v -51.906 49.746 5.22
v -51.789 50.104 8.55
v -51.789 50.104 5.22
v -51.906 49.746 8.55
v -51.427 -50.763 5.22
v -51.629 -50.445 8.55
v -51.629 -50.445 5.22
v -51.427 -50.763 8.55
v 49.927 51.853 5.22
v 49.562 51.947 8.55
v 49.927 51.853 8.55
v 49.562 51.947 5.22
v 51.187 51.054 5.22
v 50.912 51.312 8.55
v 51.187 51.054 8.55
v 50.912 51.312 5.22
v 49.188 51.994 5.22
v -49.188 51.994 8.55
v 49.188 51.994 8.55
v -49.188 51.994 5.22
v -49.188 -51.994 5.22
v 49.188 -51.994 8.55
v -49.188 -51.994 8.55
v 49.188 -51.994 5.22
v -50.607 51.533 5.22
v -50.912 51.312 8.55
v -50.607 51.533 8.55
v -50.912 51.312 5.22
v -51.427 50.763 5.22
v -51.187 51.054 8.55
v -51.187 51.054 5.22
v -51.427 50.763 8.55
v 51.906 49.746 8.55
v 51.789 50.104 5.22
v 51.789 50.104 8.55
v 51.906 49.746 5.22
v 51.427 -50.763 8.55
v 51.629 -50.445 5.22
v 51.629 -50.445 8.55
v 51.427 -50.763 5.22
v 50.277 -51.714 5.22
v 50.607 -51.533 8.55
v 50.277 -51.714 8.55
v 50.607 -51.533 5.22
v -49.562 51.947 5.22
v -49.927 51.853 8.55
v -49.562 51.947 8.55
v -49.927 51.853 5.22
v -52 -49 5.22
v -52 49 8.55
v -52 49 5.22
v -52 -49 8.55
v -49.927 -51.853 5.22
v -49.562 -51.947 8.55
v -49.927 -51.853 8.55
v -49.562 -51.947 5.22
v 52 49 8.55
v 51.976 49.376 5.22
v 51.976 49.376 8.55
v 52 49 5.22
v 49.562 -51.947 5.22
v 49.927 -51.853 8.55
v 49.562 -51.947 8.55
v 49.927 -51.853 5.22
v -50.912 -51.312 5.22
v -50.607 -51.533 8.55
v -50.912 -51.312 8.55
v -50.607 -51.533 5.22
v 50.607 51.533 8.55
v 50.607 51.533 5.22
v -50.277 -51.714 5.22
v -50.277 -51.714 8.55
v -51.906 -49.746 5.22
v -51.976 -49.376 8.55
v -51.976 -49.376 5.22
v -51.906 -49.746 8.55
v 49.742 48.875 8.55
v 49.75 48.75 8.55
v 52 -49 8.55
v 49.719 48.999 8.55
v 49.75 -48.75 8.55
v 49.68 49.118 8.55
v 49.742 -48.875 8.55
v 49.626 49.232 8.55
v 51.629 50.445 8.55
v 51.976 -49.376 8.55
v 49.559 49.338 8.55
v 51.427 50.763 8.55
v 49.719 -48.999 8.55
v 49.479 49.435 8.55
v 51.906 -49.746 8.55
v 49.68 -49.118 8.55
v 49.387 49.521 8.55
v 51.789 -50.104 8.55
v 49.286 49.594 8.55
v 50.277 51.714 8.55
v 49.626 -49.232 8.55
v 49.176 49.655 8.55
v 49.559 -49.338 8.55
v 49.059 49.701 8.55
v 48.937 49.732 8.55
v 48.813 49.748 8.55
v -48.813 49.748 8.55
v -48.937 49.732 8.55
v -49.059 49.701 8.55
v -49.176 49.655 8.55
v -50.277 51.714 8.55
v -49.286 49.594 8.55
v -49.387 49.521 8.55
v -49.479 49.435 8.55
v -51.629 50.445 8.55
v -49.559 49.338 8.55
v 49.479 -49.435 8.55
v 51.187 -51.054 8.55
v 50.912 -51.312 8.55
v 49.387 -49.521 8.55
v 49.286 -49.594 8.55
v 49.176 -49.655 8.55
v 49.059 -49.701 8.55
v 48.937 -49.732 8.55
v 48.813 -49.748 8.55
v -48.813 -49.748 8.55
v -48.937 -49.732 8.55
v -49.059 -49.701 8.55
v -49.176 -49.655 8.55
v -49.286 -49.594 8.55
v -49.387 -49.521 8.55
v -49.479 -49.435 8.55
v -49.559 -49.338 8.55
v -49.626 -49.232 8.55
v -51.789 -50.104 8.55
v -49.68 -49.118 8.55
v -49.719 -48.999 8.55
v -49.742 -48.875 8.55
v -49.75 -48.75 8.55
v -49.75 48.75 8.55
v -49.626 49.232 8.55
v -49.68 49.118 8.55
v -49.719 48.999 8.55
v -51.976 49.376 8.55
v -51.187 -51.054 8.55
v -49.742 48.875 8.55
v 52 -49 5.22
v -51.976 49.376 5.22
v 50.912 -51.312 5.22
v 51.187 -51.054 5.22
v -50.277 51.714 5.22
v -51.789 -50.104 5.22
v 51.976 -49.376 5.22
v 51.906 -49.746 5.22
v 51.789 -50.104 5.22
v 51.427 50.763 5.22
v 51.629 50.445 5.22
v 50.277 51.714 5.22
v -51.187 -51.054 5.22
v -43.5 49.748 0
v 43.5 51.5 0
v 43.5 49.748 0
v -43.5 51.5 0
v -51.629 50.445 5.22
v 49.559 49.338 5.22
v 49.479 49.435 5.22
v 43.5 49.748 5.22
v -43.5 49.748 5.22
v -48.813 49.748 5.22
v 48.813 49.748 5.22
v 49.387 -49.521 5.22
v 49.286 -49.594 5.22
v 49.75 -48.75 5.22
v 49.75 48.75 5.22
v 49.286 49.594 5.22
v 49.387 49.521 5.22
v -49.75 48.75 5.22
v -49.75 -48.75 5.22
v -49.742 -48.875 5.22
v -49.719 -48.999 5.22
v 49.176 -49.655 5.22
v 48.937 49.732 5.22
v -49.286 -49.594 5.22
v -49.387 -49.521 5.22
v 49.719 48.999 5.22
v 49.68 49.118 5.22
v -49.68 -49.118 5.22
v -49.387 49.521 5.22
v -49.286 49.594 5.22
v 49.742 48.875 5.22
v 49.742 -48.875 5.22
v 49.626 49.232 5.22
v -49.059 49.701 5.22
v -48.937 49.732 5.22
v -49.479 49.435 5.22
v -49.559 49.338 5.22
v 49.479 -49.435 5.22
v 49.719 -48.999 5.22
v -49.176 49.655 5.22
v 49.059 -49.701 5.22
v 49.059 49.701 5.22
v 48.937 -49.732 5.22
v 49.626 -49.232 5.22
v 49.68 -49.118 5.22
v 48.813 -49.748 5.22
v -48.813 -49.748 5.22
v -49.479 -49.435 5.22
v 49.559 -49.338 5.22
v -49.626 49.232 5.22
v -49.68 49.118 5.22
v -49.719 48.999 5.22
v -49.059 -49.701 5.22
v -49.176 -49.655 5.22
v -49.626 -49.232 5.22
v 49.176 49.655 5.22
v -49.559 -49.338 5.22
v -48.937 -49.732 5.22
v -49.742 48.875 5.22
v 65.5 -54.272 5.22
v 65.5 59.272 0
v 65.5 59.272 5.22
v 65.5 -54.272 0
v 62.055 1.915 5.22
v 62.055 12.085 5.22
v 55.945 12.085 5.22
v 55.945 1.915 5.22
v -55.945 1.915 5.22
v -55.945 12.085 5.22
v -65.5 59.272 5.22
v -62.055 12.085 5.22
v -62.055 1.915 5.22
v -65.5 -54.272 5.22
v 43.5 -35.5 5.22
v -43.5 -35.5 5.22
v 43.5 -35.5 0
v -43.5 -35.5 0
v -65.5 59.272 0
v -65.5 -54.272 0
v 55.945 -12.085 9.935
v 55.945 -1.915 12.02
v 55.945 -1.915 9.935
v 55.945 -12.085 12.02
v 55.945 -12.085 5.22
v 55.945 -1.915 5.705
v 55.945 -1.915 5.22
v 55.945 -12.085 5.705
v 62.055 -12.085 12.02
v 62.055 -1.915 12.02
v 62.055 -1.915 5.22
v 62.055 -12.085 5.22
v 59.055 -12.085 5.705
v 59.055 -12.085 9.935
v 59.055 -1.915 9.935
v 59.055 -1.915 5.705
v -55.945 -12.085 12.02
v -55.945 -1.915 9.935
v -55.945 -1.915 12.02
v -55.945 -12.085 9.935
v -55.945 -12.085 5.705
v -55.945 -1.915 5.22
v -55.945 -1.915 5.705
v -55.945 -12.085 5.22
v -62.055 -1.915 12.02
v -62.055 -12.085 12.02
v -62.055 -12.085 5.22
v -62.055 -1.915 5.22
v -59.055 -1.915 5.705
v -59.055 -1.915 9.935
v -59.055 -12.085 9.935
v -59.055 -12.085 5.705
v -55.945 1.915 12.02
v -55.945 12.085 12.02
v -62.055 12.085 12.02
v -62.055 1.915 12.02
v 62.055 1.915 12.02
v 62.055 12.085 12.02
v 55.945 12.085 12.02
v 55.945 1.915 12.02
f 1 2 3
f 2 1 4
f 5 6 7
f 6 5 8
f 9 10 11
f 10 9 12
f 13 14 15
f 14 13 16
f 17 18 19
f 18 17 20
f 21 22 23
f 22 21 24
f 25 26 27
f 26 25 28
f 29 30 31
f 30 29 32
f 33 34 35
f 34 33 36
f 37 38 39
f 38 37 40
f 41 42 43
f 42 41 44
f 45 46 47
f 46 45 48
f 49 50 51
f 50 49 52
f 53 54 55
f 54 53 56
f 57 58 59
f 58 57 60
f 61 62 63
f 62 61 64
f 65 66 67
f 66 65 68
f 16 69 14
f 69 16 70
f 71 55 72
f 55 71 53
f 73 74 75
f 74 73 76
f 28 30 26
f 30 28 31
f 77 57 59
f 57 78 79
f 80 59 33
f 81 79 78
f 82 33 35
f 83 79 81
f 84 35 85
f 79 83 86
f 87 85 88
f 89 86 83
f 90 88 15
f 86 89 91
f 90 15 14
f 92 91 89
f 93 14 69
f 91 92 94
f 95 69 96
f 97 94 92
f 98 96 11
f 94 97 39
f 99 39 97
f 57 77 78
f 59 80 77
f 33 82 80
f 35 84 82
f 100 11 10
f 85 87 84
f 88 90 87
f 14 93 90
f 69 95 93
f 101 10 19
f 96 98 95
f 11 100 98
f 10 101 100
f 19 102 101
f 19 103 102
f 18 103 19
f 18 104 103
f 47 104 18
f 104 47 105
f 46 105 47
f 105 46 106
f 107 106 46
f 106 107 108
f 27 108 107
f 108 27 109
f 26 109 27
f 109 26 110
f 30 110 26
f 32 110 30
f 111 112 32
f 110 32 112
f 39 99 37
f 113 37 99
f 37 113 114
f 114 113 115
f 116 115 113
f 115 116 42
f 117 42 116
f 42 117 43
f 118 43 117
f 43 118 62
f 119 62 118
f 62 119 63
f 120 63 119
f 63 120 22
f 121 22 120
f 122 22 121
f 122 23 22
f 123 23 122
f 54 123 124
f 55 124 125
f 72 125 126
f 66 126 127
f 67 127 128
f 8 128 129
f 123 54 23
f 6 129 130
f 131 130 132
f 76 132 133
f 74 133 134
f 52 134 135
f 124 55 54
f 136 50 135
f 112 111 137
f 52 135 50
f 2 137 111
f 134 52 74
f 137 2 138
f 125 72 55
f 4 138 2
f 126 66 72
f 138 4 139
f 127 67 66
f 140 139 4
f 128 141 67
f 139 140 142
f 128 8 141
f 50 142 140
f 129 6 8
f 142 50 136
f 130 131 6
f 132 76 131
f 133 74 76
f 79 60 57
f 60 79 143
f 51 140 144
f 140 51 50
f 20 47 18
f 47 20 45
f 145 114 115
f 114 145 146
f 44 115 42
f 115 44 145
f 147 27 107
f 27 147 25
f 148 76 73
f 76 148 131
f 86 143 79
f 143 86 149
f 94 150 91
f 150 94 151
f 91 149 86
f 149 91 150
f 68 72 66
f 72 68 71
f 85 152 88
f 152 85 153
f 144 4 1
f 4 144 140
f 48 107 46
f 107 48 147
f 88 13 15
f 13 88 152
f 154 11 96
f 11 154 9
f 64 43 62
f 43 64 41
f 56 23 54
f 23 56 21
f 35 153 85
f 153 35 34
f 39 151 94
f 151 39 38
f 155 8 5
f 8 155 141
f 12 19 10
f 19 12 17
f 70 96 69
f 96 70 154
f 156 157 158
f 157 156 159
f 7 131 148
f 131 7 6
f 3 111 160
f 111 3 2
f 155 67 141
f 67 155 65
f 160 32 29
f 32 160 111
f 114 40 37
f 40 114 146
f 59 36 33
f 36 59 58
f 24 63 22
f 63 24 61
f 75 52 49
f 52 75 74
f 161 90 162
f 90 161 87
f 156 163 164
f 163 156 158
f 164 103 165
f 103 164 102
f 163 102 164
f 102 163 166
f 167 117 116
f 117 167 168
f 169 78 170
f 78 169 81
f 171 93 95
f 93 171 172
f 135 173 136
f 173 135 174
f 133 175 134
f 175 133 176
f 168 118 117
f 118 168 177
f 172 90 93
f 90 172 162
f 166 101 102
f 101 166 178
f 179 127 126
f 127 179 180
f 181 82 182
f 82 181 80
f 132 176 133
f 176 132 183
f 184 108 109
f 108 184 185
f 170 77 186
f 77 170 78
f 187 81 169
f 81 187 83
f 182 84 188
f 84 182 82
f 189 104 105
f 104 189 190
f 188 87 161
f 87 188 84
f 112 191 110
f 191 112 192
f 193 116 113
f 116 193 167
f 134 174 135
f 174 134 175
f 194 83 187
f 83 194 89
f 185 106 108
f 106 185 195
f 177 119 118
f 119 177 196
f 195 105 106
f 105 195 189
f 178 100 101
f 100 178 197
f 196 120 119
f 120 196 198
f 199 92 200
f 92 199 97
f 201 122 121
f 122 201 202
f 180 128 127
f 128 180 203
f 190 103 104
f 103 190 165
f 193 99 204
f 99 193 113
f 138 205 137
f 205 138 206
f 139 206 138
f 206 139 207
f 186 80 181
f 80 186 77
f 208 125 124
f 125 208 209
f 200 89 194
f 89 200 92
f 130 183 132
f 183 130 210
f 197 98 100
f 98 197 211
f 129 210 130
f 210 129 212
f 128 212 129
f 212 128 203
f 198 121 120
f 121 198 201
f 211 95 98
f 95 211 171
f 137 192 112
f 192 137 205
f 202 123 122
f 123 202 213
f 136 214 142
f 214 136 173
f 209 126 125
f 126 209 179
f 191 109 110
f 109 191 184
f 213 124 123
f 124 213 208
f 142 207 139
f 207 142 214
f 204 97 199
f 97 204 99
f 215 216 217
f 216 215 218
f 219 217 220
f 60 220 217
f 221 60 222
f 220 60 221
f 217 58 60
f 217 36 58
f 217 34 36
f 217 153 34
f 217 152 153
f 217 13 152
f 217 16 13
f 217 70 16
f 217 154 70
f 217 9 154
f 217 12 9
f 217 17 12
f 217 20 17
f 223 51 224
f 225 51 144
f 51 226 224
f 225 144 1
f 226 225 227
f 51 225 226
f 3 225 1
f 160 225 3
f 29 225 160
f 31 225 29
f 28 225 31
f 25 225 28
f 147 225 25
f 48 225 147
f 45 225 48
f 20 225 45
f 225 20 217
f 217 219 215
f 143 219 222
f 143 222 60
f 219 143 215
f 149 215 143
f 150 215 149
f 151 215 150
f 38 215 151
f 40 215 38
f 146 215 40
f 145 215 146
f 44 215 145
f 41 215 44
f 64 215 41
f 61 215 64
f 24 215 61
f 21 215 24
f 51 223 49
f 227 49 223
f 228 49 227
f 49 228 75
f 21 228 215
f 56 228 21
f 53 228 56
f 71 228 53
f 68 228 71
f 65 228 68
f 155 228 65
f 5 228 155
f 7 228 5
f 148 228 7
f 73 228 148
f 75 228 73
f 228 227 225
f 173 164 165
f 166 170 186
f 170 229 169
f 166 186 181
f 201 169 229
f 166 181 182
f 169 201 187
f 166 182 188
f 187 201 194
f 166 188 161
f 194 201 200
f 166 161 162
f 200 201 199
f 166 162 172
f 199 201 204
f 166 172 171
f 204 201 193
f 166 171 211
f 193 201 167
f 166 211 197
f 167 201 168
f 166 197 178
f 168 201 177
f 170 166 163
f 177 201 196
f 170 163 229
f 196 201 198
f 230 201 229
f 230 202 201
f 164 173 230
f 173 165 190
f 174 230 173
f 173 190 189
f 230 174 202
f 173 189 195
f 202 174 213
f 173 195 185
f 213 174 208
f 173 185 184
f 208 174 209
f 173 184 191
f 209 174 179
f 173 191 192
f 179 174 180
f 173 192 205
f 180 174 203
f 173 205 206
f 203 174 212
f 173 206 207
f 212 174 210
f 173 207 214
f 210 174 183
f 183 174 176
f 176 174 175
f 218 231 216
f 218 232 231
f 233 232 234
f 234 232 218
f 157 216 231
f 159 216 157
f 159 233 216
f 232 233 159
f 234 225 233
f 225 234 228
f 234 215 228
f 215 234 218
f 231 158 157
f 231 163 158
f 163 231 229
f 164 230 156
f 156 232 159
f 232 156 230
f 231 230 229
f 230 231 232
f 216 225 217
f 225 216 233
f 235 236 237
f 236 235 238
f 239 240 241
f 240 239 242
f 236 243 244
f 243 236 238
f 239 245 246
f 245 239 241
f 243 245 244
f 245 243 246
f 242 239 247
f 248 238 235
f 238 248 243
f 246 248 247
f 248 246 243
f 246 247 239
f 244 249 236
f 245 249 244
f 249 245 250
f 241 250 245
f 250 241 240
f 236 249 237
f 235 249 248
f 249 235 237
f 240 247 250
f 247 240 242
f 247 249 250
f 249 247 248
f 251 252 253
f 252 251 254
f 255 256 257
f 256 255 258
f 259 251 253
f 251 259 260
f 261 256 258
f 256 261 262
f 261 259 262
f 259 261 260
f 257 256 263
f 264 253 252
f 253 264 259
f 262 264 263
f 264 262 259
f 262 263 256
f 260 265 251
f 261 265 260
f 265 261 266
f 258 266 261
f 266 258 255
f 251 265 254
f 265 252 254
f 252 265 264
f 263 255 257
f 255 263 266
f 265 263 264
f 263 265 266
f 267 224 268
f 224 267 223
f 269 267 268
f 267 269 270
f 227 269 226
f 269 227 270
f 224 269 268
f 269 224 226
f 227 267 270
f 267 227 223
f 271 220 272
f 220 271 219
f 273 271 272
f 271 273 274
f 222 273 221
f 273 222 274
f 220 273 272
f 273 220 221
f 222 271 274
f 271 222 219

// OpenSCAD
// file: lib/misc.scad
/*

Polaroid 600 / Polaroid 600se Adapter

This work is licensed under a Creative Commons Attribution-NonCommercial-ShareAlike 3.0 Unported License.

https://creativecommons.org/licenses/by-nc-sa/3.0/

-----------------------

Various parts


The nubs are stupid


*/

/* Nub dimensions [-------------------------------------------------------------- */

nub_depth = 34.19;
nub_width = 5.76;
nub_distance_from_seal = 2;
nub_distance_from_edge = 13.95;
nub_height_from_zero = 5.52;
nub_height = nub_height_from_zero - box_height;

/* Nub modules [-------------------------------------------------------------- */

module nub(nub_x, nub_y, nub_z) {
    
    translate([nub_x,nub_y,nub_z]){
        nub = [nub_width,nub_depth,nub_height];
                
        cube(nub,  center=true);
                
    }
}


module nubs() {
    nub_position1 = (outer_box_width/2-nub_width/2 - nub_distance_from_edge);
    nub_position2 = outer_box_depth/2-nub_depth/2;
    
    nub(nub_position1, nub_position2*-1, box_height);
    nub(nub_position1*-1, nub_position2, box_height);
    nub(nub_position1*-1, nub_position2*-1, box_height);
    nub(nub_position1, nub_position2, box_height);
    
}
// file: lib/claws.scad
/*

Polaroid 600 / Polaroid 600se Adapter

This work is licensed under a Creative Commons Attribution-NonCommercial-ShareAlike 3.0 Unported License.

https://creativecommons.org/licenses/by-nc-sa/3.0/

-----------------------

Claws to hook into the camera body. 

There are two claws and two dummy claws that don't hook. 

The claws hook into the body via the locking / unlocking mechanism on the 600se. 





*/


/* Claw dimensions [-------------------------------------------------------------- */

claw_height_from_zero = 12.02;

claw_width = 6.11; // measured at 5.11
claw_depth = 10.17;
claw_height= claw_height_from_zero-box_height;

claw_distance_from_seal = 2; //5.23;
claw_distance_from_side = 41.90;
claw_distance_from_otherside = 56.00;

claw_y = 7; // I wish i could derive this. but here we are. 
//used to be (outer_box_depth/2 - claw_distance_from_side) + (outer_box_depth/2 - claw_distance_from_otherside);
//echo(claw_y);

claw_leg_width = 3.00;

claw_inside_height_from_zero = 9.45;
claw_inside_height = claw_inside_height_from_zero-box_height;
claw_inside_width= claw_width - claw_leg_width; // remainder is 3





/* Claw modules [-------------------------------------------------------------- */

module claw(x,y,z, orientation) {
    translate([x,y,z]){
        rotate(a=[0,0, orientation]) {
        difference() {
            claw = [claw_width,claw_depth,claw_height];
            cube(claw, center=true);
            color( "red", 1.0 ){
                translate([claw_leg_width/2,0,-.8]){
                    inside_claw = [claw_inside_width, claw_depth+3, claw_inside_height];
                    cube(inside_claw, center=true);
                }
            }
        } 
        }
    }
}

module dumb_claw(x,y,z, orientation) {
    translate([x,y,z]){
            claw = [claw_width,claw_depth,claw_height];
            cube(claw, center=true);
    }
}


module claw_old(x,y,z, orientation) {
    translate([x,y,z]){
        rotate(a=[0,0, orientation]) {
            difference() {
                claw_coords = [claw_width,claw_depth,claw_height+z-give ];
                cube(claw_coords, center=true);
                translate([0,-1.5,-.6]){
                    claw = [claw_width,claw_depth-3,claw_height+z-give];
                    cube(claw, center=true);               
                }
            }
        }
    }
}


module claws() {
 
    claw_x = (outer_box_width/2)-14; //moved two mm towards the middle
    
    //claw_y = 11 ; 
    height = claw_height/2 + box_height;

    claw(claw_x, -claw_y, height, -180);
    
    claw(-claw_x, -claw_y, height, 0);

    dumb_claw(-claw_x, claw_y, height, 0);
    dumb_claw(claw_x, claw_y, height, 0);
}
// file: lib/seal.scad
/*

Polaroid 600 / Polaroid 600se Adapter

This work is licensed under a Creative Commons Attribution-NonCommercial-ShareAlike 3.0 Unported License.

https://creativecommons.org/licenses/by-nc-sa/3.0/

-----------------------

Light seal

Seal to block the light

The light seal fits into the groove on the 600SE to block light once the back is installed. 


*/



/* Seal dimensions [-------------------------------------------------------------- */


seal_outer = 99.5;
seal_inner = 98;
seal_height = 7.55;
seal_wall_width = 2.11;

/* Seal Module [-------------------------------------------------------------- */


module seal() {
    // set it at 0
    translate([0,0,seal_height/2]){
    difference() {
        
        seal_box = [seal_outer,seal_outer,seal_height];
        //cube(seal_box, center=true);
        miniround(seal_box, 3, center=true);
        
       // inside of the seal
        inner_box = [seal_inner,seal_inner,seal_height];
        miniround(inner_box, 1, center=true);
        //cube(inner_box_lip, center=true);
        
    }
    }
}
// file: lib/base.scad
/*

Polaroid 600 / Polaroid 600se Adapter

This work is licensed under a Creative Commons Attribution-NonCommercial-ShareAlike 3.0 Unported License.

https://creativecommons.org/licenses/by-nc-sa/3.0/

-----------------------

Back Base

This is the generic base. I don't know why it is this big. 


*/


/* Base dimensions [-------------------------------------------------------------- */

outer_box_width= 146;
outer_box_depth = 108.545;
box_height = 5.22;

base_small_difference = 17;

/* Base module [-------------------------------------------------------------- */

// Base abstraction
module standard_base_obj(base_x, base_y, base_z, seal_width) {
    // set it at 0
    base_obj(base_x, base_y, base_z, seal_width, seal_width, base_z);
}

module base_obj(base_x, base_y, base_z, inner_box_x, inner_box_y, inner_box_z) {
    // set it at 0
    translate([0,0,base_z/2]){
        difference() {
            // base
            outer_box = [base_x, base_y, base_z];
            cube(outer_box, center=true);
 
            // cut out the inside
            inner_box = [inner_box_y, inner_box_y, inner_box_z+2];
            cube(inner_box, center=true);
         }
     }   
}


//default base
module default_base() {
    standard_base_obj(outer_box_width,outer_box_depth,box_height,seal_inner+2);
}

//smaller base
module small_base() {
    standard_base_obj(outer_box_width-base_small_difference,outer_box_depth,box_height,seal_inner+2);
}


//smaller base
module cb70_base() {

    seal_inner = 85; // size of cb70 opening
    base_x = outer_box_width-base_small_difference+2;
    base_y = outer_box_depth;
    base_z = box_height;
    seal_width = seal_inner+2;

    inner_box_x = seal_width;
    inner_box_y = seal_width;
    inner_box_z = base_z + 4;
    inner_offset_y = 8;

    bottom_spacer = 6;
    bottom_offset_y = base_y/2+2; //attach the spacer here

    translate([0,0,base_z/2]){
        difference() {
            // base
                outer_box = [base_x,base_y,base_z];
                cube(outer_box, center=true);
            // cut out the inside
            inner_box = [inner_box_x,inner_box_y,inner_box_z];
            translate([0,inner_offset_y,0]){
                cube(inner_box,  center=true);
            }
        }
        
        translate([0,bottom_offset_y,0]){
            bottom_cb_70_base = [base_x,bottom_spacer,base_z];
            cube(bottom_cb_70_base, center=true);
        }
     }
 
}
// file: lib/functions.scad
/*

Polaroid 600 / Polaroid 600se Adapter

This work is licensed under a Creative Commons Attribution-NonCommercial-ShareAlike 3.0 Unported License.

https://creativecommons.org/licenses/by-nc-sa/3.0/

-----------------------

Misc functions



*/


module miniround(size, radius, center=false)
{
	$fn=50;
	x = size[0]-radius/2;
	y = size[1]-radius/2;

	minkowski()
	{
    	cube(size=[x,y,size[2]], center=center);
    	cylinder(r=radius);
    	// Using a sphere is possible, but will kill performance
    	//sphere(r=radius);
	}
}
// main file
/*

Polaroid 600 / Polaroid 600se Adapter

Refactor of first try


This work is licensed under a Creative Commons Attribution-NonCommercial-ShareAlike 3.0 Unported License.

https://creativecommons.org/licenses/by-nc-sa/3.0/

Todo:
1) Test test test


*/

include <lib/functions.scad>
  
include <lib/base.scad> // Back base
include <lib/seal.scad> // Light seal
include <lib/claws.scad>  // Claws
include <lib/misc.scad> // misc parts


module adapter() {

    union() {
        color( "green", 1.0 ){
            seal();
        }
        color( "blue", 1.0 ){
            cb70_base();
        }
        color( "red", 1.0 ){
            //nubs();
        }
        
        color( "yellow", 1.0 ){
            claws();
        }
        
    }
}





adapter(); // Let's get that adapter going!
